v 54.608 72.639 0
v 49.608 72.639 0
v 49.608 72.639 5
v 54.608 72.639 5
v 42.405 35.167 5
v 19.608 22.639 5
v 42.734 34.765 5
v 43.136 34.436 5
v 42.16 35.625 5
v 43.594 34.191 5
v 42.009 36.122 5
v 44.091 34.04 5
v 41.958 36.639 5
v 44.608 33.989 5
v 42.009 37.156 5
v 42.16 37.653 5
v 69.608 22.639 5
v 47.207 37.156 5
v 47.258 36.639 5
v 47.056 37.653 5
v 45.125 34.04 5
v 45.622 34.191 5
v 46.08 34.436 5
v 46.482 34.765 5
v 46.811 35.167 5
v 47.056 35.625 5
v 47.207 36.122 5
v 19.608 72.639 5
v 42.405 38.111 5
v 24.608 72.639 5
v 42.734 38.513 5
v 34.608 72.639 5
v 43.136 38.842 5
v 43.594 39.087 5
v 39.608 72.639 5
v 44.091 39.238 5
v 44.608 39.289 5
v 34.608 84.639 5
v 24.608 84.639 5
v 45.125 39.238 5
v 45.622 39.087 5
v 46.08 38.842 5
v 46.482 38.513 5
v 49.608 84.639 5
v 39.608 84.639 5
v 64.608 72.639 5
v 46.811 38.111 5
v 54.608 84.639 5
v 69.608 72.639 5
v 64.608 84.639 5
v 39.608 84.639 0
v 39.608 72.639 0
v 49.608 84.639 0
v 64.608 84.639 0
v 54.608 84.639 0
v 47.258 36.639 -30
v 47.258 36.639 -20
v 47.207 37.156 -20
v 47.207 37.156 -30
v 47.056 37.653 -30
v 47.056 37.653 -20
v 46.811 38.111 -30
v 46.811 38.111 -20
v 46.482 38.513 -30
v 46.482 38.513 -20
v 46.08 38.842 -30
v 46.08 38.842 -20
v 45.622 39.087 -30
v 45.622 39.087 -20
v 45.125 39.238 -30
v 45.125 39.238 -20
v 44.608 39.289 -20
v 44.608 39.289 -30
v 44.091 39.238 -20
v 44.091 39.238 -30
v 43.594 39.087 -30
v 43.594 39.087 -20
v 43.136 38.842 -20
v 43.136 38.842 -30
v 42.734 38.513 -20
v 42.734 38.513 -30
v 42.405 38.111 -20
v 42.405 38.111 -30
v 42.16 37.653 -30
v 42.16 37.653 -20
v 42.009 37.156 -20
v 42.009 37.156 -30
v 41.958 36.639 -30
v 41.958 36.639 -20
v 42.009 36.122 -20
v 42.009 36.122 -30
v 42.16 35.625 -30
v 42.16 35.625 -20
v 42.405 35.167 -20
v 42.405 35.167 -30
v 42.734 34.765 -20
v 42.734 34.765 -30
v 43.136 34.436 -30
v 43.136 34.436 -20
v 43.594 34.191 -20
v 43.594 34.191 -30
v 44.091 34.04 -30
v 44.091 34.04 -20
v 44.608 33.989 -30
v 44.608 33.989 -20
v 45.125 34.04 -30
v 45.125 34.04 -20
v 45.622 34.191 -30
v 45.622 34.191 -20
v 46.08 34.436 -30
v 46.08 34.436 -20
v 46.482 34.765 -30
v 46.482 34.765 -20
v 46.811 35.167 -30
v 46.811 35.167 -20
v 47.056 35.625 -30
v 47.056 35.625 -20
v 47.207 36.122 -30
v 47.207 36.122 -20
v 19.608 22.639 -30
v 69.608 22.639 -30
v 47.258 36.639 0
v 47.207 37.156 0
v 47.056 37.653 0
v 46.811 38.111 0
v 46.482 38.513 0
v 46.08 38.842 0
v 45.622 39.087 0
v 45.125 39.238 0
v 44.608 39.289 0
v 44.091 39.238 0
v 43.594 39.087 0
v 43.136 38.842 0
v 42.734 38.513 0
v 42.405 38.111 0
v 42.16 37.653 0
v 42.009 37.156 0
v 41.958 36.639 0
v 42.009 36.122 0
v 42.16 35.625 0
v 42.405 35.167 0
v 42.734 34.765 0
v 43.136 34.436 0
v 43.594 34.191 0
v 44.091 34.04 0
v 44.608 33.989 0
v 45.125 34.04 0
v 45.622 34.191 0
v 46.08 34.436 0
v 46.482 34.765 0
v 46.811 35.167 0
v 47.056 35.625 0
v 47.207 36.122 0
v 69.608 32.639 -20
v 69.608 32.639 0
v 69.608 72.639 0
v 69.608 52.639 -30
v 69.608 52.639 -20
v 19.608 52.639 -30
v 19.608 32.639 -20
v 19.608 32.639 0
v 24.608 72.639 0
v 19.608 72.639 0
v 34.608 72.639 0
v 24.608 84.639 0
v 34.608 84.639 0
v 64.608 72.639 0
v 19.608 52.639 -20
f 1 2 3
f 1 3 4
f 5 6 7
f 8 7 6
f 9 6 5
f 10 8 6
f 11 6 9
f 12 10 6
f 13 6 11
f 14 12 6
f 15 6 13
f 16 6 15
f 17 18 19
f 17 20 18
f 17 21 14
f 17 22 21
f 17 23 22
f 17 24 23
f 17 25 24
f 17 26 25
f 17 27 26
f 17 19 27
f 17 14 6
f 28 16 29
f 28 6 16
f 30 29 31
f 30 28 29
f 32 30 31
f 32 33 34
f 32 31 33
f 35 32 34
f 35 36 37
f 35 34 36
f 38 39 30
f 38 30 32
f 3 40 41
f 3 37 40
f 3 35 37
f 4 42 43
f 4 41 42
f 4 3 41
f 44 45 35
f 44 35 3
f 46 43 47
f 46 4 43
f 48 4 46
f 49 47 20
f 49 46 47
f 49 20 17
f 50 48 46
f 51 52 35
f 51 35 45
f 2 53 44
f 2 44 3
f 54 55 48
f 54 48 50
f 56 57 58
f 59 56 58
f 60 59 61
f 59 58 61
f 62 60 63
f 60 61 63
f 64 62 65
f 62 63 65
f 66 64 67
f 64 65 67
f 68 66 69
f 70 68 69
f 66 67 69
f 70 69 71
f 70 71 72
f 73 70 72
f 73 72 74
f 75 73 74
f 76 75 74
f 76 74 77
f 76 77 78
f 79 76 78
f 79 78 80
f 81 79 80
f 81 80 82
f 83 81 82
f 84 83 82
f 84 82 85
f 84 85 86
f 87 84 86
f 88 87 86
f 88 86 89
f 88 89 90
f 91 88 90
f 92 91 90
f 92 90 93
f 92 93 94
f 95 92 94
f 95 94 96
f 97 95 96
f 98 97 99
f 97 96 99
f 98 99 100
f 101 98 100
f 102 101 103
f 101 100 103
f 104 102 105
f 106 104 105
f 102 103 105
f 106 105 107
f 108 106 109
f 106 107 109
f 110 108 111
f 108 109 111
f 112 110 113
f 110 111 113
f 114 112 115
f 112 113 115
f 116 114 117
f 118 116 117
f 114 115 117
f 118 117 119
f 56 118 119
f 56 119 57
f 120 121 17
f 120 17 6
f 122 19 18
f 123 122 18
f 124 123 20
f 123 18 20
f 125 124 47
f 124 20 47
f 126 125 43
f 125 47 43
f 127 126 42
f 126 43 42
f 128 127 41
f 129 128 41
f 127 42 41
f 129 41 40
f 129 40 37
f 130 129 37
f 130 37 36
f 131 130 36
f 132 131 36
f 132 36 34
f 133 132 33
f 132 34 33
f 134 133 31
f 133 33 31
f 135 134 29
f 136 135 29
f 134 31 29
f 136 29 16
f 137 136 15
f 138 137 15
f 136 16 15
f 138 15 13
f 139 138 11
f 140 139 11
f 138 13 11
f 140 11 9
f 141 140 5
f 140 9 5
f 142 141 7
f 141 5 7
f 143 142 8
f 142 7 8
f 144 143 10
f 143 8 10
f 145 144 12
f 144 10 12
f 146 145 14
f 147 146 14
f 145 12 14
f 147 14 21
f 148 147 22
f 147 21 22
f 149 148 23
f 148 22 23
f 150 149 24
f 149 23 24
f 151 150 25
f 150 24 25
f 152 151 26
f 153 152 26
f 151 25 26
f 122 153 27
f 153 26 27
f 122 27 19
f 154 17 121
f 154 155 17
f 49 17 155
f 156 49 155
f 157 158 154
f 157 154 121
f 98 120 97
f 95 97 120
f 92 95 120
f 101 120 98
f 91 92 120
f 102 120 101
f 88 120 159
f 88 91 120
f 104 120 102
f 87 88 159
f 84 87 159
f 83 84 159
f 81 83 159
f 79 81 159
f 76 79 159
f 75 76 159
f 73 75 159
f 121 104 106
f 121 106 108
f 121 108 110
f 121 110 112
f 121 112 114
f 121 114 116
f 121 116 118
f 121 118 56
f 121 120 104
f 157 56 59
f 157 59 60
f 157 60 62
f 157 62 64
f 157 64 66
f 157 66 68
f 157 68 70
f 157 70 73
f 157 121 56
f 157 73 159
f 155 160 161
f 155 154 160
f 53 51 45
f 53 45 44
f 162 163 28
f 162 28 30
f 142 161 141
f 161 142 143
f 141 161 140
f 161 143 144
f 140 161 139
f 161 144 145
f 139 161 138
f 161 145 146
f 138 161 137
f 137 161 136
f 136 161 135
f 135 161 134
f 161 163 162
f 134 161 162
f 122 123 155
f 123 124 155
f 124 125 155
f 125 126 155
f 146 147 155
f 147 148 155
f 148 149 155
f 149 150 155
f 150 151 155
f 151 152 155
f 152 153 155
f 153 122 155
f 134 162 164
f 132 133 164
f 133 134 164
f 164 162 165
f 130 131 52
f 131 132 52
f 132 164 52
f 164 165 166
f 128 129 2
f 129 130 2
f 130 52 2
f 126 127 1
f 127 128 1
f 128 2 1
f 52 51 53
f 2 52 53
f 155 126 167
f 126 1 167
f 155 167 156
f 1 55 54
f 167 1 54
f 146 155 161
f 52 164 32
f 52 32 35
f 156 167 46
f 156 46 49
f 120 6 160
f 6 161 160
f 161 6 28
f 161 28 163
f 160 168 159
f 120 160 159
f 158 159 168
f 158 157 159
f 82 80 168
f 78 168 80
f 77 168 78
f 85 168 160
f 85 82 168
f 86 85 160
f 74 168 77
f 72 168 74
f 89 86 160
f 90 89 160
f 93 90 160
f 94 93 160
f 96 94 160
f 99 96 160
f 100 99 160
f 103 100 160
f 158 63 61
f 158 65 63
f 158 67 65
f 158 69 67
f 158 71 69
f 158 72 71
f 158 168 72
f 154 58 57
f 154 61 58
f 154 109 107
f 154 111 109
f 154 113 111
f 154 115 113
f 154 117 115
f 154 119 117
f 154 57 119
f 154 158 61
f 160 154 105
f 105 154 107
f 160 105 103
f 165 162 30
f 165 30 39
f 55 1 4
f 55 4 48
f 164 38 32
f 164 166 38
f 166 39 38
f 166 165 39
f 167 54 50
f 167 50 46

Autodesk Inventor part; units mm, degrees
ref_plane "YZ Plane" through (0, 0, 0) normal (1, 0, 0) x (0, 1, 0)
ref_plane "XZ Plane" through (0, 0, 0) normal (0, 1, 0) x (-1, 0, 0)
ref_plane "XY Plane" through (0, 0, 0) normal (0, 0, 1) x (1, 0, 0)
sketch "Sketch1" plane through (0, 0, 0) normal (0, 0, 1) x (1, 0, 0)
  line L0 (69.608, 72.6391) -> (69.608, 22.6391)
  line L1 (69.608, 22.6391) -> (19.608, 22.6391)
  line L2 (19.608, 22.6391) -> (19.608, 72.6391)
  line L3 (19.608, 72.6391) -> (24.608, 72.6391)
  line L4 (24.608, 72.6391) -> (24.608, 84.6391)
  line L5 (24.608, 84.6391) -> (34.608, 84.6391)
  line L6 (34.608, 84.6391) -> (34.608, 72.6391)
  line L7 (34.608, 72.6391) -> (39.608, 72.6391)
  line L8 (39.608, 72.6391) -> (39.608, 84.6391)
  line L9 (39.608, 84.6391) -> (49.608, 84.6391)
  line L10 (49.608, 84.6391) -> (49.608, 72.6391)
  line L11 (49.608, 72.6391) -> (54.608, 72.6391)
  line L12 (54.608, 72.6391) -> (54.608, 84.6391)
  line L13 (54.608, 84.6391) -> (64.608, 84.6391)
  line L14 (64.608, 84.6391) -> (64.608, 72.6391)
  line L15 (64.608, 72.6391) -> (69.608, 72.6391)
  point P0 (0, 0)
  dimension "d0" = 50
  dimension "d1" = 50
  dimension "d2" = 5
  dimension "d3" = 12
  dimension "d4" = 10
  dimension "d5" = 12
  dimension "d6" = 5
  dimension "d7" = 12
  dimension "d8" = 10
  dimension "d9" = 12
  dimension "d10" = 5
  dimension "d11" = 12
  dimension "d12" = 10
  dimension "d13" = 12
  dimension "d14" = 5
extrude "Extrusion1" add sketch "Sketch1" along normal blind 5
sketch "Sketch2" plane through (69.608, 22.6391, 0) normal (1, 0, 0) x (0, 0, -1)
  line L0 (0, 50) -> (0, 0) projected
  line L1 (0, 0) -> (30, 0)
  line L2 (30, 0) -> (30, 25)
  line L3 (30, 25) -> (20, 25)
  line L4 (20, 25) -> (20, 10)
  line L5 (20, 10) -> (0, 10)
  point P0 (0, -22.6391)
  dimension "d17" = 30
  dimension "d18" = 25
  dimension "d19" = 10
  dimension "d20" = 15
  dimension "d21" = 20
sketch "Sketch3" plane through (0, 0, 5) normal (0, 0, 1) x (1, 0, 0)
  point P0 (0, 0)
extrude "Extrusion2" add sketch "Sketch2" against normal blind 50
sketch "Sketch4" plane through (69.608, 22.6391, 5) normal (1, 0, 0) x (0, 0, -1)
  line L0 (35, 25) -> (25, 25) projected
  line L1 (35, 25) -> (35, 30)
  line L2 (35, 25) -> (35, 0) projected
  line L3 (35, 30) -> (25, 30)
  line L4 (25, 30) -> (25, 25)
  line L5 (25, 25) -> (35, 25)
  point P0 (5, -22.6391)
  dimension "d24" = 5
  dimension "d25" = 10
  dimension "d26" = 5
  dimension "d27" = 10
extrude "Extrusion3" add sketch "Sketch4" against normal blind 50
sketch "Sketch5" plane through (69.608, 22.6391, 5) normal (1, 0, 0) x (0, 0, -1)
  point P0 (5, -22.6391)
sketch "Sketch6" plane through (0, 0, 5) normal (0, 0, 1) x (1, 0, 0)
  line L0 (69.608, 22.6391) -> (19.608, 22.6391) projected
  circle A0 centre (44.608, 36.6391) radius 2.65
  point P0 (0, 0)
  dimension "d31" = 5.3
extrude "Extrusion4" cut sketch "Sketch6" against normal blind 50
sketch "Sketch7" plane through (69.608, 22.6391, 5) normal (1, 0, 0) x (0, 0, -1)
  point P0 (5, -22.6391)
sketch "Sketch8" plane through (0, 0, 5) normal (0, 0, 1) x (1, 0, 0)
  point P0 (0, 0)
sketch "Sketch9" plane through (69.608, 22.6391, 5) normal (1, 0, 0) x (0, 0, -1)
  point P0 (5, -22.6391)
sketch "Sketch10" plane through (69.608, 22.6391, 5) normal (1, 0, 0) x (0, 0, -1)
  point P0 (5, -22.6391)
properties part number "Casis Kiri Roda"
